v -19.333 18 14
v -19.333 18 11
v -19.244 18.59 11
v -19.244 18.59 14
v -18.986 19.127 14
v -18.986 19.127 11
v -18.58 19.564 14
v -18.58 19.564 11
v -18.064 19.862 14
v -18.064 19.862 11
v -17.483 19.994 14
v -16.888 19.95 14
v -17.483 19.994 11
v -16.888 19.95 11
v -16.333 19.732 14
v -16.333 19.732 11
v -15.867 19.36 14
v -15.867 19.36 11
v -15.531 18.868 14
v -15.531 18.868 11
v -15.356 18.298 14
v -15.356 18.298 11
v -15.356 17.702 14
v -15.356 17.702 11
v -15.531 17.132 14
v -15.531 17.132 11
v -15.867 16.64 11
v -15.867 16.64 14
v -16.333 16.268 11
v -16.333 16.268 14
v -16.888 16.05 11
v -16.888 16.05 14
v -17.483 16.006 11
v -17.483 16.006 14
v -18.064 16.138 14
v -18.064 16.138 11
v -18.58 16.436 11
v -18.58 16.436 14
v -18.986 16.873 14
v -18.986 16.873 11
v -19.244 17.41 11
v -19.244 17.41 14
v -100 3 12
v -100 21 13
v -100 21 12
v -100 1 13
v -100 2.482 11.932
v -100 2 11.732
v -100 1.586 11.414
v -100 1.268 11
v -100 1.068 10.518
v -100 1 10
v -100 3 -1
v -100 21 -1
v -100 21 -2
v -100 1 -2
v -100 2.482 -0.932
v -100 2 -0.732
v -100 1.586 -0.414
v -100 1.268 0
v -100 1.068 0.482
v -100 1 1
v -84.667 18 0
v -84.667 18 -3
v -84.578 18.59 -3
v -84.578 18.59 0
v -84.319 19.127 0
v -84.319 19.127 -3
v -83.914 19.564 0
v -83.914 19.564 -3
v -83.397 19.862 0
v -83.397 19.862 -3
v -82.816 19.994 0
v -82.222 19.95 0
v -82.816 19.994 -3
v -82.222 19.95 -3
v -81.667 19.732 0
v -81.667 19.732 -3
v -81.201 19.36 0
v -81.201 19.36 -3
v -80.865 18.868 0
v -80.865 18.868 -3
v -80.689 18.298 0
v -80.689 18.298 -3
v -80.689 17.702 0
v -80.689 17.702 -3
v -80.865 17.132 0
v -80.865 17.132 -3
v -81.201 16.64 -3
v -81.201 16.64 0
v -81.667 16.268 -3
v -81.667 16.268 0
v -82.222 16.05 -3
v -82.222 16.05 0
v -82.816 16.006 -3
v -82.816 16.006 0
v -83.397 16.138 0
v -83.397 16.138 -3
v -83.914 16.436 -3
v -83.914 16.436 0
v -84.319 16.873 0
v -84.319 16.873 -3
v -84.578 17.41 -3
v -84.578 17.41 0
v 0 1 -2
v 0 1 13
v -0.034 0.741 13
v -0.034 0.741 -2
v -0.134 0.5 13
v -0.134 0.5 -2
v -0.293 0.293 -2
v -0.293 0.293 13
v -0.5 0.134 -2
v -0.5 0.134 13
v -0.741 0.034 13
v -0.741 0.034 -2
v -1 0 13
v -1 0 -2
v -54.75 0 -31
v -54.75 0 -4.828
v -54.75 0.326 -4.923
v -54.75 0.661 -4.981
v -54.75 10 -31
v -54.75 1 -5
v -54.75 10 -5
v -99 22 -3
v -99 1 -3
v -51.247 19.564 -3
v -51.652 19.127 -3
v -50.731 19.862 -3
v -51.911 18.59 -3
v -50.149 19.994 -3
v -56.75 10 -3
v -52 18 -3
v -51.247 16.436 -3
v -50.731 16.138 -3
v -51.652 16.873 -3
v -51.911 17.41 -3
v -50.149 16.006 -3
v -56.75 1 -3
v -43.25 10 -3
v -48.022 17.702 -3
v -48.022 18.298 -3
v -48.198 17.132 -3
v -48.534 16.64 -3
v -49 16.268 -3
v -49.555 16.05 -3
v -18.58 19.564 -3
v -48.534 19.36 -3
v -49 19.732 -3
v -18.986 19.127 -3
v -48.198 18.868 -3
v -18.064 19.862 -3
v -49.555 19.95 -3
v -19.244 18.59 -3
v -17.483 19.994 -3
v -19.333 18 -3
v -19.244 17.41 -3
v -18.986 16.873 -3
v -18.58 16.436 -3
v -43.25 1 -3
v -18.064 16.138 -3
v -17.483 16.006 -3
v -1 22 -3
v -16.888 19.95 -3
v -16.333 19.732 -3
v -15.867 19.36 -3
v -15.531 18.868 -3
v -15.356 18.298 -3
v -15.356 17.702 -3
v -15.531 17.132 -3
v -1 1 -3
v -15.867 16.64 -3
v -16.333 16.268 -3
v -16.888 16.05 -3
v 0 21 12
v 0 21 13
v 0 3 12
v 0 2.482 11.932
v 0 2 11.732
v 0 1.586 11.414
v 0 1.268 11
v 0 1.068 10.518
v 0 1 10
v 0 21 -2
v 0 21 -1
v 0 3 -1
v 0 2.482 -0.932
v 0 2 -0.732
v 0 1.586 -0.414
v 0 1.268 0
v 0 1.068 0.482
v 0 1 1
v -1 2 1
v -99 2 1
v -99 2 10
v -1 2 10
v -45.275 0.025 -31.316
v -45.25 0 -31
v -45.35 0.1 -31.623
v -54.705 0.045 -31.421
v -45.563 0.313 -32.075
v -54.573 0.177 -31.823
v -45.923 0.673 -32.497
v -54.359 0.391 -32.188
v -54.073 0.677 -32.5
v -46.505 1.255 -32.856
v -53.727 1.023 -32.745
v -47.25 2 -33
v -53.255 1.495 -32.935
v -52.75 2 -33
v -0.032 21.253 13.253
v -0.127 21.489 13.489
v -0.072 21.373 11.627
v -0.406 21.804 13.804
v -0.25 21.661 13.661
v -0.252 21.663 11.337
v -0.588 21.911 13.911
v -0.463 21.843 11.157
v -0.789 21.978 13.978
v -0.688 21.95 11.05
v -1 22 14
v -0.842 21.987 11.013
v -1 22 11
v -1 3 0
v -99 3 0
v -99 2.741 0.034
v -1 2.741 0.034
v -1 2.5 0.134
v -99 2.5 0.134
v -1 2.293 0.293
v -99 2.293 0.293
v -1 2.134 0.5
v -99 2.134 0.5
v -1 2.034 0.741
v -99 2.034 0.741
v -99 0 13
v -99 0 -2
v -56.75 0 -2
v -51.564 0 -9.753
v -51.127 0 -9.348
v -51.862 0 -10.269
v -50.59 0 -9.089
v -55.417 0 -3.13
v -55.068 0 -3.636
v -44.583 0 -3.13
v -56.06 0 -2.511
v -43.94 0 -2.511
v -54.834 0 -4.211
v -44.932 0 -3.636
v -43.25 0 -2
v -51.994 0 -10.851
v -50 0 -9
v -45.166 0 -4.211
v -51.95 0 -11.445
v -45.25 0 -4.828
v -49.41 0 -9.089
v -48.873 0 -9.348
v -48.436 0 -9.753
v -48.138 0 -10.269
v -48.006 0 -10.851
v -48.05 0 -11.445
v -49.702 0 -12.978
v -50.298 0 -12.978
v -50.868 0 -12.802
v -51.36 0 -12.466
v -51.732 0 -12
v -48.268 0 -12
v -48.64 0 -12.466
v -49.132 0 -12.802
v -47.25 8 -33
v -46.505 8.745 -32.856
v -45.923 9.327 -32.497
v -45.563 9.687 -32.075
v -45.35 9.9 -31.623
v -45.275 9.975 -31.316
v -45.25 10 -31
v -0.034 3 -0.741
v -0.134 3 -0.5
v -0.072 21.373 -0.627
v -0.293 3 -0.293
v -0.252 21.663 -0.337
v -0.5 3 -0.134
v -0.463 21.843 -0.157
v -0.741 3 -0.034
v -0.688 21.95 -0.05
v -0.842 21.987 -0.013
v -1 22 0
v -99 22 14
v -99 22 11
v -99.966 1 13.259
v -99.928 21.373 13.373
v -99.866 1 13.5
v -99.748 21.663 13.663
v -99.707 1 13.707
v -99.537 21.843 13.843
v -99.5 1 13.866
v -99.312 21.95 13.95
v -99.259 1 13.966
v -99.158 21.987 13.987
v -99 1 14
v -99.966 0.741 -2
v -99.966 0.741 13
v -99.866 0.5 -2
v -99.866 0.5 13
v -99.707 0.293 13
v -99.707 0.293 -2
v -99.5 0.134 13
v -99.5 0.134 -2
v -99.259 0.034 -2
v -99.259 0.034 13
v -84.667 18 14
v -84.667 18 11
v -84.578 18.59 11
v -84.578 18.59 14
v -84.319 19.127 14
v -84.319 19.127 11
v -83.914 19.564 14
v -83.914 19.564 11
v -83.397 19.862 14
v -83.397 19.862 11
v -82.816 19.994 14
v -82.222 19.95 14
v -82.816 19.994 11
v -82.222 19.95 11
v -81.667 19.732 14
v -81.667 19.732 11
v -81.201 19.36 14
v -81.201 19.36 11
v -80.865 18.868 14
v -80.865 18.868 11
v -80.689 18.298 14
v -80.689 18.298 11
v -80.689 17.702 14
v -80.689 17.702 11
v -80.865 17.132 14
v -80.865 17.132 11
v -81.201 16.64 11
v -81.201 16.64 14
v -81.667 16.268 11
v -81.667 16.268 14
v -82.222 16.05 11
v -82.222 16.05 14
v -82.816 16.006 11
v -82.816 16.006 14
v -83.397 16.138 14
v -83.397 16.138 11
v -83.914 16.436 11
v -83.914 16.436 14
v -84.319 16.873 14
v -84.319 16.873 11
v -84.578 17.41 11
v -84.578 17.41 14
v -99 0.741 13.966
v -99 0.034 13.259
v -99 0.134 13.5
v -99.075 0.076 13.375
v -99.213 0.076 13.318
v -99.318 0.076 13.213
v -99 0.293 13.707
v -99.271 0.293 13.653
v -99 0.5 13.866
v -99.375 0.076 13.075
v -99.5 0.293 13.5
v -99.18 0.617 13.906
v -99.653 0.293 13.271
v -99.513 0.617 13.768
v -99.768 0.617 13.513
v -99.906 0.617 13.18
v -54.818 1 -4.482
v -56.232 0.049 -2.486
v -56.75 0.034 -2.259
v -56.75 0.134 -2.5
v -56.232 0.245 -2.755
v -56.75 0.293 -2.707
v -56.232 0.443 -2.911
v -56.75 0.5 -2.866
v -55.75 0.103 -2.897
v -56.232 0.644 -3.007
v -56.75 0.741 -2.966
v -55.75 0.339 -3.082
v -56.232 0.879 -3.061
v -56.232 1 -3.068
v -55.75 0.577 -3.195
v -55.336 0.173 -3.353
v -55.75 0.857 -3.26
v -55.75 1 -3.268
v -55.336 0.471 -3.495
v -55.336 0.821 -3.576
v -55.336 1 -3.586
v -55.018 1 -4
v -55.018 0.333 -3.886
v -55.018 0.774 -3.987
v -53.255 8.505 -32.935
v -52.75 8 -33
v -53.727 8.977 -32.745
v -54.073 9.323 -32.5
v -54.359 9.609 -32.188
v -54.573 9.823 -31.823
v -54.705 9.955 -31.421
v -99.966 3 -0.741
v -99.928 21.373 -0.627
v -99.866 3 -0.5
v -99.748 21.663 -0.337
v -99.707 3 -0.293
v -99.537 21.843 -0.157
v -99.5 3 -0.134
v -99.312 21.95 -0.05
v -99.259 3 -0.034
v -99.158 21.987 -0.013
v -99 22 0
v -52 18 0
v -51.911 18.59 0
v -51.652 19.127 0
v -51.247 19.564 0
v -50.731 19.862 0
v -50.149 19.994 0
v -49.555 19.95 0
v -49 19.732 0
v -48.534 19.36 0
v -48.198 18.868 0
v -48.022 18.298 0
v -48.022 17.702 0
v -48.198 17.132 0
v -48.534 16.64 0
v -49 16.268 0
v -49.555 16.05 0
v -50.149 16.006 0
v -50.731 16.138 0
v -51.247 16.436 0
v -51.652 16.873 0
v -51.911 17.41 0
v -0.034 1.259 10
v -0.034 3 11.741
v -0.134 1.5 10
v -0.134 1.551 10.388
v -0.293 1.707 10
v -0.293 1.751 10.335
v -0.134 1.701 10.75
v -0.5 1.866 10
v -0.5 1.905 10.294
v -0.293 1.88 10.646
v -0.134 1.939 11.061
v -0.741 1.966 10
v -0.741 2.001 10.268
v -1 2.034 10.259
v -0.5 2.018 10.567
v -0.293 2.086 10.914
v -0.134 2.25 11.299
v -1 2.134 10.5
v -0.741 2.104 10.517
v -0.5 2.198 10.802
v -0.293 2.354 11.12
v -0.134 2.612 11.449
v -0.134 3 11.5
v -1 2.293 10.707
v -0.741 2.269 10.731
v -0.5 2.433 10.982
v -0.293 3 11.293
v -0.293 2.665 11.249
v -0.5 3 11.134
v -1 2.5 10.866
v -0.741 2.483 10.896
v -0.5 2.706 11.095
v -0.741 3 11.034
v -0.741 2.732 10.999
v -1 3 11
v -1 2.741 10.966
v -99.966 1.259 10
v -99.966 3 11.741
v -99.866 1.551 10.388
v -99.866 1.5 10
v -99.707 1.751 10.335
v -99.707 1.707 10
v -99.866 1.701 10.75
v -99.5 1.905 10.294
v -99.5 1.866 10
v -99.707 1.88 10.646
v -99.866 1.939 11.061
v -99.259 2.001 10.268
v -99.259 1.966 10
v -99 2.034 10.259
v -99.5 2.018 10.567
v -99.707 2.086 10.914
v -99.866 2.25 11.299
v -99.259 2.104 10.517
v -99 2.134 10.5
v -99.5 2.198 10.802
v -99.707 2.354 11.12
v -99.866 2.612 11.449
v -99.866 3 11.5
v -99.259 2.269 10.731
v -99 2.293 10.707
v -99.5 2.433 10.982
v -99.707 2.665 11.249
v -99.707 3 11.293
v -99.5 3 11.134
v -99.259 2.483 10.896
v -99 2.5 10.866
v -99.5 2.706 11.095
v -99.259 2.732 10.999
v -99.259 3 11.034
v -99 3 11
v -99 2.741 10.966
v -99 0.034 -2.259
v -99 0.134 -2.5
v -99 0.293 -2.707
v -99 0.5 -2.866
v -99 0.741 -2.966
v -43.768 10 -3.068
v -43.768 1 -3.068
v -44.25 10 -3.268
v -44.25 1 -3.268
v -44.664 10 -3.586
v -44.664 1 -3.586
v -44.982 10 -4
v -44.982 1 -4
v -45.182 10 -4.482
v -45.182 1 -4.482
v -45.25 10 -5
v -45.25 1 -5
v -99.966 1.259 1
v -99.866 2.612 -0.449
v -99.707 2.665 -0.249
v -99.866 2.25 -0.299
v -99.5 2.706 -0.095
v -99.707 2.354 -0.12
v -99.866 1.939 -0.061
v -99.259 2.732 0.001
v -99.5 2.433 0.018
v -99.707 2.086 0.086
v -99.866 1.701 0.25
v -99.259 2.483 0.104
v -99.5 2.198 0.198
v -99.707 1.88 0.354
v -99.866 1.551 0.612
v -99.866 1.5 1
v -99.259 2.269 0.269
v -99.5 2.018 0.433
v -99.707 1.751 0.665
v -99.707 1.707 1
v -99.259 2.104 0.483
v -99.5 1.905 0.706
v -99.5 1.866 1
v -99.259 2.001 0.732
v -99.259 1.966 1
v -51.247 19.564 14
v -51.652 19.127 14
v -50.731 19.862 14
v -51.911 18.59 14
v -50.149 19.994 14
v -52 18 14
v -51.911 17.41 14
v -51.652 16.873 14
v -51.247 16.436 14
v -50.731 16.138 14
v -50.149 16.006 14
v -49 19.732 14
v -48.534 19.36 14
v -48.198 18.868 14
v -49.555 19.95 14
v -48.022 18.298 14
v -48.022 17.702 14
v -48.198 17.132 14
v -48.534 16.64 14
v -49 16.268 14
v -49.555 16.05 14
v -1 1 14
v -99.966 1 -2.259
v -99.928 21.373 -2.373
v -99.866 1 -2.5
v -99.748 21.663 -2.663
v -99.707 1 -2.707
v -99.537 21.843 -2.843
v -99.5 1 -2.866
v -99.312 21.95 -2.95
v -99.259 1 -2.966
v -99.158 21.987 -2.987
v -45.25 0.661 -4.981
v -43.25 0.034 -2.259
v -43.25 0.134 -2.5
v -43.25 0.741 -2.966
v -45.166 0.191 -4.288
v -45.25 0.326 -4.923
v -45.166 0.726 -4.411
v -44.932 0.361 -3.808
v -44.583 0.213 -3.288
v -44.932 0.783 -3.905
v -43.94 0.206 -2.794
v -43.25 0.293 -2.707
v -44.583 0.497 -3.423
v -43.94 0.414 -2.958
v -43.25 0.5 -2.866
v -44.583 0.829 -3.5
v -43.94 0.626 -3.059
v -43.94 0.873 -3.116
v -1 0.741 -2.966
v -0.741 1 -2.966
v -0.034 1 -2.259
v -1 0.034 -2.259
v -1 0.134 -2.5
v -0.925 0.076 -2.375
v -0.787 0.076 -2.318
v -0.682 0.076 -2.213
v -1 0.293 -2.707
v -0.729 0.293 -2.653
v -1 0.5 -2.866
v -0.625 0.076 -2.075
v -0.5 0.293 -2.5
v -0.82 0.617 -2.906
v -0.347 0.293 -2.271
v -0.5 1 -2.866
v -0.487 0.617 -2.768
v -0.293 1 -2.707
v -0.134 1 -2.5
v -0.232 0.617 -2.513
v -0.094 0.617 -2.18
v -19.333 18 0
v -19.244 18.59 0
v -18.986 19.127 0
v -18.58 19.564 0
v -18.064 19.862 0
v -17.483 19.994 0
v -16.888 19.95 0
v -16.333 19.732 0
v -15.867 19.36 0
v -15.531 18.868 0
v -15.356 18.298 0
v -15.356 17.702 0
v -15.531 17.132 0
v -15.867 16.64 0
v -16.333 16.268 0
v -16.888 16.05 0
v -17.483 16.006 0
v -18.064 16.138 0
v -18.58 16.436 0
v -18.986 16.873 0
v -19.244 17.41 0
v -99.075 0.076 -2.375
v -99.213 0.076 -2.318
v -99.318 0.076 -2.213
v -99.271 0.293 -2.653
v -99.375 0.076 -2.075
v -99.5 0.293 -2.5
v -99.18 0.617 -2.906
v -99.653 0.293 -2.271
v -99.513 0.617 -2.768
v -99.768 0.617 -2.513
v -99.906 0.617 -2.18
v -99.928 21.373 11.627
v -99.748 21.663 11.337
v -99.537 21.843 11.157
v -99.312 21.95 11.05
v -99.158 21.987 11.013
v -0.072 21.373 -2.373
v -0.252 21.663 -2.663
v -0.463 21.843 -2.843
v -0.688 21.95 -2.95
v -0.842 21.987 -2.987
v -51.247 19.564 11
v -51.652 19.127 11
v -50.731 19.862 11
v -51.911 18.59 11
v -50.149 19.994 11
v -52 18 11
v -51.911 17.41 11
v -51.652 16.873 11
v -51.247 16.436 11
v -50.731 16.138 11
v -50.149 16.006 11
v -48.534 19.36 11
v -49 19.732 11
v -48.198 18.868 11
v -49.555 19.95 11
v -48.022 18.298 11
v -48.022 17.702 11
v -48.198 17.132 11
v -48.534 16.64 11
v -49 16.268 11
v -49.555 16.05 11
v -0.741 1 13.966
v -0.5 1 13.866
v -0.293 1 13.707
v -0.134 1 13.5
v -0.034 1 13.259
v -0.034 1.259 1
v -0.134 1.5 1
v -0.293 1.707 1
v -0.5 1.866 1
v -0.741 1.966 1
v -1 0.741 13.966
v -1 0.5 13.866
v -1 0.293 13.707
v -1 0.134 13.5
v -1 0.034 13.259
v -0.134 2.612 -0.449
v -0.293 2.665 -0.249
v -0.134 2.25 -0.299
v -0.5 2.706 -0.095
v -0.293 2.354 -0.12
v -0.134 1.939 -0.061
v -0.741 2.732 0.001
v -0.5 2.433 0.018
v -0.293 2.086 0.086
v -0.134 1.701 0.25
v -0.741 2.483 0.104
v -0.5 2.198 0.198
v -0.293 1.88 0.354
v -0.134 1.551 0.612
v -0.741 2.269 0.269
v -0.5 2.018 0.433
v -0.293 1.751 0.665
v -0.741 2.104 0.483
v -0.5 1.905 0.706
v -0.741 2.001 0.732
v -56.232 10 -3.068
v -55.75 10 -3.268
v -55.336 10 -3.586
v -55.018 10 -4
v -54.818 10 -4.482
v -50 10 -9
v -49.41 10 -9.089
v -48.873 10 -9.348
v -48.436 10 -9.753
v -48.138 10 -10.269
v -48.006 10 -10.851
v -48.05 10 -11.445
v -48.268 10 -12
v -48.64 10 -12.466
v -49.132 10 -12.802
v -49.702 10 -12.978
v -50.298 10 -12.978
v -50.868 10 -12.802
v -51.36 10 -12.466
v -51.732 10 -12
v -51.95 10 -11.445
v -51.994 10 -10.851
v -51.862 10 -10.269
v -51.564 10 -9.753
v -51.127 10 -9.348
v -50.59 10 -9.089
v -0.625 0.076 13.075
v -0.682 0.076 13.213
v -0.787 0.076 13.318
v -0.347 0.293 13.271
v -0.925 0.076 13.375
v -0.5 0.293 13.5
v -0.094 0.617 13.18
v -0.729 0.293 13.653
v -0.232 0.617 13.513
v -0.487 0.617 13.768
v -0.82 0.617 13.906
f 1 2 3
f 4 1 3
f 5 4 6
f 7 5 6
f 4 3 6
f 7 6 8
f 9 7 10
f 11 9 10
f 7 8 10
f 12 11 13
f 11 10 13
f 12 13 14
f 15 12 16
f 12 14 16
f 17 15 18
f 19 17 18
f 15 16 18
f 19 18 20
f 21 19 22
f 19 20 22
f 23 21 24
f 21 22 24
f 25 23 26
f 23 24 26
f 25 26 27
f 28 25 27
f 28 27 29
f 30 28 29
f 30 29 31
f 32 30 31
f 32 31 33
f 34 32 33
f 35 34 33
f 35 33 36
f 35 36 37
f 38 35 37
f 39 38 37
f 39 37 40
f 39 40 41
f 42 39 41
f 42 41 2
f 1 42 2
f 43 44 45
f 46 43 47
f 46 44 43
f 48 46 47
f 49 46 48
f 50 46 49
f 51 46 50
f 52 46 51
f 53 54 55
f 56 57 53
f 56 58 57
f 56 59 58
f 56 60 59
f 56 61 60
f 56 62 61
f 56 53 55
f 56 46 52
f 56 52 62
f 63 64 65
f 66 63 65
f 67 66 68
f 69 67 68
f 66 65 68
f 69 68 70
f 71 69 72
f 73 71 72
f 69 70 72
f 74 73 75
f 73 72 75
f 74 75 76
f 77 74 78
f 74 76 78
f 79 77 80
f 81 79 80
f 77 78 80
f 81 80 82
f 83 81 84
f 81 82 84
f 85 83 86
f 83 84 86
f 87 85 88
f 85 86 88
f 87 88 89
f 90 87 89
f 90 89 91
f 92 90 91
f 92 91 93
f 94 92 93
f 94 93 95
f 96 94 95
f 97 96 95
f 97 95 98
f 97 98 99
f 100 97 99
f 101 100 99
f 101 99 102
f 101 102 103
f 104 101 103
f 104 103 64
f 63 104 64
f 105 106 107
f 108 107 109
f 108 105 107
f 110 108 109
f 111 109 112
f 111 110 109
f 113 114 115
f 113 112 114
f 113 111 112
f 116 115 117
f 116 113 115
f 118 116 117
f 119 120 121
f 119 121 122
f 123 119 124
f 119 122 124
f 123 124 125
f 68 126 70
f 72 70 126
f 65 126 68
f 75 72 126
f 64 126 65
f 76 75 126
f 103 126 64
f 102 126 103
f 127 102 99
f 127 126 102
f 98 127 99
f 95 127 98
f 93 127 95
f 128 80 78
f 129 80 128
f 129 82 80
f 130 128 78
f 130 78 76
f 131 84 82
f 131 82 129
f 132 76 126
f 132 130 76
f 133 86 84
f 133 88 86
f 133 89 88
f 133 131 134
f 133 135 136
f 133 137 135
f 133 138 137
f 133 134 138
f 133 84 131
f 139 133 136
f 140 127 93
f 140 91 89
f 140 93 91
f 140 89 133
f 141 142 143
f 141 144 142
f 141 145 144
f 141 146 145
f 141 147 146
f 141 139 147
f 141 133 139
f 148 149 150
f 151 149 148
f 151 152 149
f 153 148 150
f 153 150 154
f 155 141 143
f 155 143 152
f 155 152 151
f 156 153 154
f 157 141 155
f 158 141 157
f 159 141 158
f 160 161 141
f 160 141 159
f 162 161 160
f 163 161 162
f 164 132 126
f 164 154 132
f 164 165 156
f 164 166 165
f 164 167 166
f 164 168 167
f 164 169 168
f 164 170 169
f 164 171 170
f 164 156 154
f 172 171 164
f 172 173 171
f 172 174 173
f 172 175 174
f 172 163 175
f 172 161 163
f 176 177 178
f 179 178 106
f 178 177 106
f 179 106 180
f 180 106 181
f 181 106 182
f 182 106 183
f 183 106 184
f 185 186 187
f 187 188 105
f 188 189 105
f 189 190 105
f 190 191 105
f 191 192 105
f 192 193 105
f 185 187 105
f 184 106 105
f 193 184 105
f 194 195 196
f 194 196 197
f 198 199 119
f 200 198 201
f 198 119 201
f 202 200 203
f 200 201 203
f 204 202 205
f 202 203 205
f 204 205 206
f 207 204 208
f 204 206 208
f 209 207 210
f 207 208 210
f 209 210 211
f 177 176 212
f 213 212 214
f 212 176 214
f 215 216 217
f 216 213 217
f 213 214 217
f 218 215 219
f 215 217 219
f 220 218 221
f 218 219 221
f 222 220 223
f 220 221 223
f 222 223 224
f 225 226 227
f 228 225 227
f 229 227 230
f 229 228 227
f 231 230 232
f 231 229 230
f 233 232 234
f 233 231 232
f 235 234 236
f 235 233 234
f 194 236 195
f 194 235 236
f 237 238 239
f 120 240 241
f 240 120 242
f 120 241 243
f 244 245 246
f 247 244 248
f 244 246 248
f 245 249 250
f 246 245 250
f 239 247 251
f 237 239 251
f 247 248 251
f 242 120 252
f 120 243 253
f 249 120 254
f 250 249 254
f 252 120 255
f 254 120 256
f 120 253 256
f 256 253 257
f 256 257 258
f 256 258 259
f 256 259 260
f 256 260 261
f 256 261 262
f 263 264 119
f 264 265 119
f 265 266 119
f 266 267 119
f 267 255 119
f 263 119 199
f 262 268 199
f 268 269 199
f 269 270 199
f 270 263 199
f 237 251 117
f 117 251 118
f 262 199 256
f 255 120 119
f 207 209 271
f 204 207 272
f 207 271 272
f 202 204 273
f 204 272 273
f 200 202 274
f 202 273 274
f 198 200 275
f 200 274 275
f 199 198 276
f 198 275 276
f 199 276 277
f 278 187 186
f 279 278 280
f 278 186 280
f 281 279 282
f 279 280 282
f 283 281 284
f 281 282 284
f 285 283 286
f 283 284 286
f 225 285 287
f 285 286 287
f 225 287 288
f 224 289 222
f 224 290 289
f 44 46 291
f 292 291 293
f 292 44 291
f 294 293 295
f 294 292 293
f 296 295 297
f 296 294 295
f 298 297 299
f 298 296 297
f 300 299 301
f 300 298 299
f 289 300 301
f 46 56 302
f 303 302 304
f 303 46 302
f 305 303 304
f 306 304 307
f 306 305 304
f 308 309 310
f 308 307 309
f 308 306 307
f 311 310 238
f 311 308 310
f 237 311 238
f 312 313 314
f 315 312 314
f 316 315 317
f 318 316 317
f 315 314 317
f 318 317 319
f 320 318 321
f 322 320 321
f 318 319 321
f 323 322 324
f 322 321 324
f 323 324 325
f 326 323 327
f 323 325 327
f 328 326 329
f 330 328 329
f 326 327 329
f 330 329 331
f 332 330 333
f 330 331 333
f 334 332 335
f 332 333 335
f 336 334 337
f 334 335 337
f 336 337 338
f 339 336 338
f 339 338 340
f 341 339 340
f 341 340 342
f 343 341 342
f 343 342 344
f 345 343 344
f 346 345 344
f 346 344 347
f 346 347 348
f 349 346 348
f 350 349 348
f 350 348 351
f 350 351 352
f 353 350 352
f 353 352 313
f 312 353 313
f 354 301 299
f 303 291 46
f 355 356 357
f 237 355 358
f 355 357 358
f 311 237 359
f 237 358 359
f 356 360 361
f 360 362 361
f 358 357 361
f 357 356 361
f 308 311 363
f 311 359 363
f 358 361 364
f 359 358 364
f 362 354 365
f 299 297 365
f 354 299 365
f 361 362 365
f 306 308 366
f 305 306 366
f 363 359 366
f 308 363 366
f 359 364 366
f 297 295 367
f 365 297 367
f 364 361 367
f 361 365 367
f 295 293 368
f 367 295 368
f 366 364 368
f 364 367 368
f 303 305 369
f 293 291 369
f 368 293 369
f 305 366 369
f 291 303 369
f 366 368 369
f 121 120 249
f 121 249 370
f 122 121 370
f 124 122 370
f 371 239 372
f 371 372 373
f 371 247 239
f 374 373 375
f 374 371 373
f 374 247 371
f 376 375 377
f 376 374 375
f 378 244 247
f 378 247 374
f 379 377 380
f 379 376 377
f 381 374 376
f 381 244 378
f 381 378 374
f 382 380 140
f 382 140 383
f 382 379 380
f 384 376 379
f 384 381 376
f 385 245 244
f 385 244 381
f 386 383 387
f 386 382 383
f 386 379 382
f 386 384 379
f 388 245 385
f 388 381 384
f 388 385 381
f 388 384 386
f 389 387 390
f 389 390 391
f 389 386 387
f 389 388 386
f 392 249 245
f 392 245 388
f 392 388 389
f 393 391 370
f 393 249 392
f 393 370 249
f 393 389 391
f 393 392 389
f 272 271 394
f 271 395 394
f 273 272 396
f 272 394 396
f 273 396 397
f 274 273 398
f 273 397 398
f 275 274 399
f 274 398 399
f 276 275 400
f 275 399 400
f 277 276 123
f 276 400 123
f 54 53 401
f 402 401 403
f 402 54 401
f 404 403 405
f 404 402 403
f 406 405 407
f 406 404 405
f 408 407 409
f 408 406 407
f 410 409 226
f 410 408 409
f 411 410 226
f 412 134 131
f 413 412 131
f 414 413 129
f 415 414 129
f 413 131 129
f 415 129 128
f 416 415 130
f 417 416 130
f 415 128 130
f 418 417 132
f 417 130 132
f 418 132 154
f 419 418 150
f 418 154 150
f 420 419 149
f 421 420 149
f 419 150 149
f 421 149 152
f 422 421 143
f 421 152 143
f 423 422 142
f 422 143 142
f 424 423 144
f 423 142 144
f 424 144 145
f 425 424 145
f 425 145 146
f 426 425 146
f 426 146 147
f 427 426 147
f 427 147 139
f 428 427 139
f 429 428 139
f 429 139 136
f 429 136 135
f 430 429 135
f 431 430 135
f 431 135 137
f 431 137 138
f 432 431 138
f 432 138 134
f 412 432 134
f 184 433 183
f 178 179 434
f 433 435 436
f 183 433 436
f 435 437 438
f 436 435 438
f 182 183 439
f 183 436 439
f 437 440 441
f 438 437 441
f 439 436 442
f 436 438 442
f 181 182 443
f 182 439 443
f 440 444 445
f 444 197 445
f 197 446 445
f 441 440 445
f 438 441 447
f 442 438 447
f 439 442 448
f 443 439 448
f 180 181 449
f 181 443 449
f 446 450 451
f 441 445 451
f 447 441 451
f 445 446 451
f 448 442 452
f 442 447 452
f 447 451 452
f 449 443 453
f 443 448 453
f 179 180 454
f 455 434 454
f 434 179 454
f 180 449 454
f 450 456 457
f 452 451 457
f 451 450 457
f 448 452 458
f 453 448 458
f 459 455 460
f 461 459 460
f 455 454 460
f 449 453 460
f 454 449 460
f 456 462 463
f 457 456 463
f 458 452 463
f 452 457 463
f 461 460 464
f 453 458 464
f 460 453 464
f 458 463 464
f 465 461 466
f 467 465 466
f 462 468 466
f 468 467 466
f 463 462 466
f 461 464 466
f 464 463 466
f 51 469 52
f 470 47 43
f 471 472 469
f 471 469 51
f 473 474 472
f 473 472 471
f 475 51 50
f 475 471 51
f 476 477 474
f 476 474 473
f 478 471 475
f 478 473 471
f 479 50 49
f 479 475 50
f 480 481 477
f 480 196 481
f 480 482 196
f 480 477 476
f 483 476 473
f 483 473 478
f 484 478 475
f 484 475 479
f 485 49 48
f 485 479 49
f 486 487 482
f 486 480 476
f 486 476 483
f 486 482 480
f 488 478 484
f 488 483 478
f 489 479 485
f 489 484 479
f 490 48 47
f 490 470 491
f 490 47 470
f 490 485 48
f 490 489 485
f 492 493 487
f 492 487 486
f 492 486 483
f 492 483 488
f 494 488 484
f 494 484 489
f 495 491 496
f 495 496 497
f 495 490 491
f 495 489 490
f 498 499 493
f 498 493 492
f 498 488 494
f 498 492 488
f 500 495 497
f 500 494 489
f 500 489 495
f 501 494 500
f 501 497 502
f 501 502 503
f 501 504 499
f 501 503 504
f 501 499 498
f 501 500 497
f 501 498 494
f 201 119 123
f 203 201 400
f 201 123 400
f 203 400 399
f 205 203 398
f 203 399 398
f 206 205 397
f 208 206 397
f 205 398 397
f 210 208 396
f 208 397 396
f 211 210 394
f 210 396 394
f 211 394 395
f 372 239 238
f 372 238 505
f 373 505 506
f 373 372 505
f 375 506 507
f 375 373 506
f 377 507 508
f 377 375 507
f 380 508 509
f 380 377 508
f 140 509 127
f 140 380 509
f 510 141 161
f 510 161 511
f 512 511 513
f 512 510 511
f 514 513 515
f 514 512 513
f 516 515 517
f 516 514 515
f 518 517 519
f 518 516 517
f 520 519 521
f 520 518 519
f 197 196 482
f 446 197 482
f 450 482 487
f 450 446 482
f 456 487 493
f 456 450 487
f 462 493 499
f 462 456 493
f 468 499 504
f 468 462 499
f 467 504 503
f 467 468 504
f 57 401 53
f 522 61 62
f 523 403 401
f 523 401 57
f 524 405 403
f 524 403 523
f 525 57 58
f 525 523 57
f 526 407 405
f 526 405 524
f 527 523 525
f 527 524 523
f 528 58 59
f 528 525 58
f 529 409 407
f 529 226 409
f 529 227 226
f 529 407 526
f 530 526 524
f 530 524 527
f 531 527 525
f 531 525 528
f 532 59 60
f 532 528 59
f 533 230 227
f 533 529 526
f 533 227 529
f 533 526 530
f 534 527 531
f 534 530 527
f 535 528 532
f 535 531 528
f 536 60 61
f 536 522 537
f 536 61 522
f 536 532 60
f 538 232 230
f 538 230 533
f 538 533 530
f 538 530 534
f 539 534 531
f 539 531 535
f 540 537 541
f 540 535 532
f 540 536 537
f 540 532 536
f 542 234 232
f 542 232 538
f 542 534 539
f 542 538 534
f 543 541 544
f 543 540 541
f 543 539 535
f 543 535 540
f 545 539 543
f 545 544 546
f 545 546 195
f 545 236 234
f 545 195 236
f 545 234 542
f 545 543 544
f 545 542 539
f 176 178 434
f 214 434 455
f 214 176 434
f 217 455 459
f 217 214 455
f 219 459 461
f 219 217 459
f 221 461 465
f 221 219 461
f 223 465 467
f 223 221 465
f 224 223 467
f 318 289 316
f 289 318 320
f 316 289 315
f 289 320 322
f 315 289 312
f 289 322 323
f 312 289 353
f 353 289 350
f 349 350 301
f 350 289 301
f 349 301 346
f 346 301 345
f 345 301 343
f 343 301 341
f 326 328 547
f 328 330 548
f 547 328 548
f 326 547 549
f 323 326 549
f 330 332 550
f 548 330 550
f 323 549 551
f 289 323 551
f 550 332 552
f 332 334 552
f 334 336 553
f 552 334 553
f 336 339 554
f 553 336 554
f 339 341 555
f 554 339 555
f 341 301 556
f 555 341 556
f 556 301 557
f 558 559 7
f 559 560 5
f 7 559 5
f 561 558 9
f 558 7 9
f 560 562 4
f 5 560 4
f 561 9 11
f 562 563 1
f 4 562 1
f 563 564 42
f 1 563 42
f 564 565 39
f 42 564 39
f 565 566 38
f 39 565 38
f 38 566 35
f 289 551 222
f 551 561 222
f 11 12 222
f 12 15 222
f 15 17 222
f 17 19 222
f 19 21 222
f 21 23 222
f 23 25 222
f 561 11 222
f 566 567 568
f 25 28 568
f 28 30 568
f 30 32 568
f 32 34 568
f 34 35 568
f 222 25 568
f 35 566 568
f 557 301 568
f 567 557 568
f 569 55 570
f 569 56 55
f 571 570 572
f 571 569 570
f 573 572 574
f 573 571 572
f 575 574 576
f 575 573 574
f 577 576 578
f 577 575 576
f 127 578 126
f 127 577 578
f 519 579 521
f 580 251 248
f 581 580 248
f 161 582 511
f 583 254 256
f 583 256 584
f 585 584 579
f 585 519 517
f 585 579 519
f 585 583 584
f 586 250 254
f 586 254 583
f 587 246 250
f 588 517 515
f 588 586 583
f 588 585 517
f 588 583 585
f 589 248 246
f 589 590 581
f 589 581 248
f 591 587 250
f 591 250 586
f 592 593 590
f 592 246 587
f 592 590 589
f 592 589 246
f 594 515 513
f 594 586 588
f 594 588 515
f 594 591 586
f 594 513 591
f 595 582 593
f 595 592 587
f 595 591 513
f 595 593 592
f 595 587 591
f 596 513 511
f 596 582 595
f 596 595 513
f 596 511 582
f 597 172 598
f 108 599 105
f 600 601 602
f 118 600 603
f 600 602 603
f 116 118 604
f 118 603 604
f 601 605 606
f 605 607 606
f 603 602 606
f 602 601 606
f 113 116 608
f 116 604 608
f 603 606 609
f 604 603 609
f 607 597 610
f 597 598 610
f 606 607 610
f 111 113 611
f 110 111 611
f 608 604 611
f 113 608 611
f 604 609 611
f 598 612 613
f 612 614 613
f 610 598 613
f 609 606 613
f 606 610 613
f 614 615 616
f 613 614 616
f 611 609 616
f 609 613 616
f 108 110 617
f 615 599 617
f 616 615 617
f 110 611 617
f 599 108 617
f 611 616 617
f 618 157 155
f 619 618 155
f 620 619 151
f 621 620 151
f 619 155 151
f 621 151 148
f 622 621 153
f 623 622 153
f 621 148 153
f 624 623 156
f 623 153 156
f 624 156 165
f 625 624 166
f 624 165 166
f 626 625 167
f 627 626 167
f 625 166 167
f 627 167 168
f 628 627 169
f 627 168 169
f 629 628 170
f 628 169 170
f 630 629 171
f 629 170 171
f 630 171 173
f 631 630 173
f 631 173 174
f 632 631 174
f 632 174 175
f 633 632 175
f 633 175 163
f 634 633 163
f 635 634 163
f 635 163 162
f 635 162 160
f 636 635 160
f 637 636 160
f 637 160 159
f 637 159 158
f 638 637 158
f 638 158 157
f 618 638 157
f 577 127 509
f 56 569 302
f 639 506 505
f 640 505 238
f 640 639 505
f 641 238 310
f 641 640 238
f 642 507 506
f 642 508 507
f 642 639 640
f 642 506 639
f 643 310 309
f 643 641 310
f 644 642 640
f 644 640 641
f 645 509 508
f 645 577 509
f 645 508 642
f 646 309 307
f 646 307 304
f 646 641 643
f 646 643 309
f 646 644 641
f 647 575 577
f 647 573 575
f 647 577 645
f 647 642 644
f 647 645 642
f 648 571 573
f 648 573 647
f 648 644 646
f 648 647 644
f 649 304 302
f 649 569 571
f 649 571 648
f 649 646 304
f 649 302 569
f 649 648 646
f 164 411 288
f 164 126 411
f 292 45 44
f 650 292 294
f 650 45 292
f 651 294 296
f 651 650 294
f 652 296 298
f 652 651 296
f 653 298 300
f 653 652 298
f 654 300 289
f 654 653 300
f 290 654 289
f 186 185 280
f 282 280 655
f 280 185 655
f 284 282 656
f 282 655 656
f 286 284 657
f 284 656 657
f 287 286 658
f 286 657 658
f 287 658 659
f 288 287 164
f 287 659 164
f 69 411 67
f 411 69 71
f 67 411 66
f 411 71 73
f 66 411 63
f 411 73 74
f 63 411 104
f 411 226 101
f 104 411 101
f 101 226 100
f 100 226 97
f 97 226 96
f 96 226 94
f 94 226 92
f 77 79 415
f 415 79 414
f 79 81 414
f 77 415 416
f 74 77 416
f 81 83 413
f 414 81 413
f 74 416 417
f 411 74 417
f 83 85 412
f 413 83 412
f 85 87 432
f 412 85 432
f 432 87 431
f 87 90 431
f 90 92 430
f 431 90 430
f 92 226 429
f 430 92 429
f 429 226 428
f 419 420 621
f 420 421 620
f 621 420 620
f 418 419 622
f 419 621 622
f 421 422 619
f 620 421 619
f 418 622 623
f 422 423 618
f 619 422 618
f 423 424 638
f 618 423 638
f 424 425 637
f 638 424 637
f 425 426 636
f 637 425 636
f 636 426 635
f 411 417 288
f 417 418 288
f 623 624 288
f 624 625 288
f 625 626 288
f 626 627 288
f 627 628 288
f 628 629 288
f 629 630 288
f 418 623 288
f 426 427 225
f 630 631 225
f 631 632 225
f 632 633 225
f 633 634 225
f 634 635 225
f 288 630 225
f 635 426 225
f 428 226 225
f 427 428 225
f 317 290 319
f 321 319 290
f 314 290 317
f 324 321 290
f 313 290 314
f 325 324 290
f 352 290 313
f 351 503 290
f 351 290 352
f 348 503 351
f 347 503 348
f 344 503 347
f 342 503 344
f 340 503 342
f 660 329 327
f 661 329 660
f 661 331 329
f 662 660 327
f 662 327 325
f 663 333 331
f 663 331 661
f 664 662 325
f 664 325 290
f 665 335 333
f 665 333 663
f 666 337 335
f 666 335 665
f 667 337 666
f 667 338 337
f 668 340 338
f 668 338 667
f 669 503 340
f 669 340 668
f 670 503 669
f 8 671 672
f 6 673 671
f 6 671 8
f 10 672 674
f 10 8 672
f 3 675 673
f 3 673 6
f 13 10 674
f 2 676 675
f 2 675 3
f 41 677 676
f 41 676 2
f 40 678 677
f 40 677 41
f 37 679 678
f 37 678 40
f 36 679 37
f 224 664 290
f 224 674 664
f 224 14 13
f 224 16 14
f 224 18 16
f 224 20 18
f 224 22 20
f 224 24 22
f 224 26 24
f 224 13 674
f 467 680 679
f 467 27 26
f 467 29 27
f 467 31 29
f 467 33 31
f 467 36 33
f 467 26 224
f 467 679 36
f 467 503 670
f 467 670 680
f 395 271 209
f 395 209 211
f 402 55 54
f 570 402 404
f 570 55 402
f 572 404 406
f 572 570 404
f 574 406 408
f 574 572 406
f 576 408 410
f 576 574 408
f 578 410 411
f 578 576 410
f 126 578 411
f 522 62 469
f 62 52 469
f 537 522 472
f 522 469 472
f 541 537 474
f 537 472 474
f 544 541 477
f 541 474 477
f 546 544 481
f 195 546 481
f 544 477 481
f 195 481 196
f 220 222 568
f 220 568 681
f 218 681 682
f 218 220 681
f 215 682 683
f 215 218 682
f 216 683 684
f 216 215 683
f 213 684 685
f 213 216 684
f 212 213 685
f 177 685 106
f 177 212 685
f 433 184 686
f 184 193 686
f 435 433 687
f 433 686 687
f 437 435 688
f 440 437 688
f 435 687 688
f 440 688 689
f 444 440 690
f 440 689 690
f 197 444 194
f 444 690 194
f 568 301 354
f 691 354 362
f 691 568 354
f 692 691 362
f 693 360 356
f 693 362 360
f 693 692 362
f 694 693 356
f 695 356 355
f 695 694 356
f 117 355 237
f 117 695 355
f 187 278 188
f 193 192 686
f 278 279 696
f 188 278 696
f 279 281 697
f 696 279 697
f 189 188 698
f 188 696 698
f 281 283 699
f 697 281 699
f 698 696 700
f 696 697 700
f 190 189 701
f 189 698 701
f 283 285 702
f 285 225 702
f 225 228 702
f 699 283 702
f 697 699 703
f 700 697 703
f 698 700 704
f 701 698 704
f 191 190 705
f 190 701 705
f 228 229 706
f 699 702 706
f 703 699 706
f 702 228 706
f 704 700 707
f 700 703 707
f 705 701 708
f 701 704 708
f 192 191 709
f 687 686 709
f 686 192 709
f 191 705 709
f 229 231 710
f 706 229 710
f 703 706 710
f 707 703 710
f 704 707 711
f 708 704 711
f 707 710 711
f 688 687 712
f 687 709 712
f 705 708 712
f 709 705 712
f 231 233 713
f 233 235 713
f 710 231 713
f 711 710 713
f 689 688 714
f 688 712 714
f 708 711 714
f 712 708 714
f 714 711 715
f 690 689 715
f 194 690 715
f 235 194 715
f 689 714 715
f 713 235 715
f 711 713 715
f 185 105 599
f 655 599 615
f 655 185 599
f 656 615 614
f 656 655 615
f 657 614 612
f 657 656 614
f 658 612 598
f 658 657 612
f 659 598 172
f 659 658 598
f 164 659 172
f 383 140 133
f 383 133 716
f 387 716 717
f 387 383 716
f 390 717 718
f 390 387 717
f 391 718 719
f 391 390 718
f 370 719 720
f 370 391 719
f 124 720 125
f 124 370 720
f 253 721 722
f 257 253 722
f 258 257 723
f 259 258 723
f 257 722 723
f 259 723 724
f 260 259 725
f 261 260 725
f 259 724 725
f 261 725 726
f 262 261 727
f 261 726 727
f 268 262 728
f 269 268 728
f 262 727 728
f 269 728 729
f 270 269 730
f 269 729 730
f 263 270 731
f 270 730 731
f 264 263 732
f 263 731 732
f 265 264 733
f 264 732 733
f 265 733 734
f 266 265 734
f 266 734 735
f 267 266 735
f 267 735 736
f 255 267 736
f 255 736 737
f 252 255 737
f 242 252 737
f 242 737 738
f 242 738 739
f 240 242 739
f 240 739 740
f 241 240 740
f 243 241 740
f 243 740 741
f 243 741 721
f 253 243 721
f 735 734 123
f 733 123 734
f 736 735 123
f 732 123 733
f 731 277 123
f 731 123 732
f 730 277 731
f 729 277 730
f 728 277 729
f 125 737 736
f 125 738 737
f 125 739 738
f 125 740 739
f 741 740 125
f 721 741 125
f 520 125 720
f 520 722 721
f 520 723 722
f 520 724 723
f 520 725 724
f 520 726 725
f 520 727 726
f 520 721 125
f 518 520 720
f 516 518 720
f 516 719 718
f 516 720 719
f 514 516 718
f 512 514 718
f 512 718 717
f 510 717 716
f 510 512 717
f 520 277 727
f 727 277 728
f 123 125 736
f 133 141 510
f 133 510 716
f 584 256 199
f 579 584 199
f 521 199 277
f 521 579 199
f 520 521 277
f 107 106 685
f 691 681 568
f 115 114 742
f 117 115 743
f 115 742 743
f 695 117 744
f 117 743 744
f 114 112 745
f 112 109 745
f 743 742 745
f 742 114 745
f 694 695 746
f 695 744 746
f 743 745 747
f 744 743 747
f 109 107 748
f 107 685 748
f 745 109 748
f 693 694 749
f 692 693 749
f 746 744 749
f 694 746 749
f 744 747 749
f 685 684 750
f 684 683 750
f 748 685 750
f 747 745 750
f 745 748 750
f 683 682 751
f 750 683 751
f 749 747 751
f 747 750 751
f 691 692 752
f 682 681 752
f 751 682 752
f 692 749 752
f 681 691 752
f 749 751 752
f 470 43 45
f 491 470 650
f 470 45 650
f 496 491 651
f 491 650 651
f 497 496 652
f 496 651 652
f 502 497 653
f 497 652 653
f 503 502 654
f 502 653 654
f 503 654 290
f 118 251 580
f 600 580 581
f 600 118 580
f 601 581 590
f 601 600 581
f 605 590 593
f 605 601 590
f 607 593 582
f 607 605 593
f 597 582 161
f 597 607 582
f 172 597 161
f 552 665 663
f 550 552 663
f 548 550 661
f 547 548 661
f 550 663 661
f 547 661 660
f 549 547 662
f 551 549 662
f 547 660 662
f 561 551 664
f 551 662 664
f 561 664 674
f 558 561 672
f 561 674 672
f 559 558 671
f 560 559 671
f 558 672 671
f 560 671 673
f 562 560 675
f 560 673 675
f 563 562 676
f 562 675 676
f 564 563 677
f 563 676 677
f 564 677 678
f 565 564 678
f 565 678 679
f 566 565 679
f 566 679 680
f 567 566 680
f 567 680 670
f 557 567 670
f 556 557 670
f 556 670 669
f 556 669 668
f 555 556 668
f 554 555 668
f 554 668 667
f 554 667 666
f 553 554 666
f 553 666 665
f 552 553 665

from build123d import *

# Parameters (mm, degrees)
SKETCH2_W                = 100
SKETCH2_H                = 3
SKETCH2_H_2              = 11
BOSS_EXTRUDE2_DEPTH      = 2
SKETCH3_W                = 100
SKETCH3_H                = 3
BOSS_EXTRUDE3_DEPTH      = 20
FILLET2_R                = 1
BOSS_EXTRUDE5_DEPTH      = 30
BOSS_EXTRUDE5_DEPTH_BACK = 1
SKETCH5_W                = 9.5
SKETCH5_H                = 10
FILLET3_R                = 2
FILLET4_R                = 2
SKETCH6_R                = 2
CUT_EXTRUDE1_DEPTH       = 39
SKETCH7_R                = 2
CUT_EXTRUDE2_DEPTH       = 39


# Some blends are built 0.0001 mm under size
with BuildPart() as part:
    # Sketch2 → Boss-Extrude2 (new body)
    with BuildSketch(Plane(origin=(0, 0, 0), x_dir=(1, 0, 0), z_dir=(0, 1, 0))):
        with Locations((-50, 1.5)):
            Rectangle(SKETCH2_W, SKETCH2_H)
        with Locations((-50, -5.5)):
            Rectangle(SKETCH2_W, SKETCH2_H_2)
        with Locations((-50, -12.5)):
            Rectangle(SKETCH2_W, SKETCH2_H)
    extrude(amount=BOSS_EXTRUDE2_DEPTH)

    # Sketch3 → Boss-Extrude3 (add)
    with BuildSketch(Plane(origin=(0, 2, 0), x_dir=(1, 0, 0), z_dir=(0, 1, 0))):
        with Locations((-50, -12.5)):
            Rectangle(SKETCH3_W, SKETCH3_H)
        with Locations((-50, 1.5)):
            Rectangle(SKETCH3_W, SKETCH3_H)
    extrude(amount=BOSS_EXTRUDE3_DEPTH)

    # Fillet2
    fillet2_edges = [part.edges().sort_by_distance(p)[0] for p in [
        (-100, 11, -3),
        (0, 11, -3),
        (0, 11, 14),
        (-100, 11, 14),
        (-100, 2, 5.5),
        (0, 2, 5.5),
        (0, 12, 11),
        (-100, 12, 11),
        (-100, 22, 12.5),
        (0, 22, 12.5),
        (-50, 2, 11),
        (-50, 2, 0),
        (-100, 12, 0),
        (0, 12, 0),
        (-100, 22, -1.5),
        (0, 22, -1.5),
        (-50, 0, -3),
        (0, 0, 5.5),
        (-50, 0, 14),
        (-100, 0, 5.5),
    ]]
    fillet(fillet2_edges, radius=FILLET2_R - 0.0001)  # a hair under: the kernel refuses the full size

    # Sketch5 → Boss-Extrude5 (add, two sides: drawn at the far end of the back side and taken through both)
    with BuildSketch(Plane(origin=(0, 0, -3), x_dir=(-1, 0, 0), z_dir=(0, 0, -1)).offset(-BOSS_EXTRUDE5_DEPTH_BACK)):
        with Locations((50, 5)):
            Rectangle(SKETCH5_W, SKETCH5_H)
    extrude(amount=BOSS_EXTRUDE5_DEPTH + BOSS_EXTRUDE5_DEPTH_BACK)

    # Fillet3
    fillet3_edges = [part.edges().sort_by_distance(p)[0] for p in [
        (-45.25, 5, -33),
        (-50, 0, -33),
        (-54.75, 5, -33),
        (-50, 10, -33),
    ]]
    fillet(fillet3_edges, radius=FILLET3_R)

    # Fillet4
    # the kernel refuses this fillet: 2 mm, written as the material it adds along each edge
    with BuildSketch(Plane(origin=(-54.75, 0.9999, -2.0001), x_dir=(0, 0.0062831439655585564, -0.9999802608561371), z_dir=(0, -0.9999802608561371, -0.0062831439655585564))) as fillet4_piece_1_section:
        with BuildLine():
            CenterArc((-0.9999 - FILLET4_R, -FILLET4_R), FILLET4_R, 0, 90)
            Line((-0.9999, -FILLET4_R), (-0.9999, 0))
            Line((-0.9999, 0), (-0.9999 - FILLET4_R, 0))
        make_face()
    fillet4_piece_1 = revolve(axis=Axis((-54.75, 0.9999, -2.0001), (1, 0, 0)), revolution_arc=359.64, mode=Mode.PRIVATE)
    fillet4_piece_1 = split(fillet4_piece_1, bisect_by=Plane(origin=(-55.461006322, 0, -2.760267515), z_dir=(0, 1, 0)), keep=Keep.TOP, mode=Mode.PRIVATE)
    fillet4_piece_1 = split(fillet4_piece_1, bisect_by=Plane(origin=(-55.461006322, 0.239732481, 0), z_dir=(0, 0, -1)), keep=Keep.TOP, mode=Mode.PRIVATE)
    add(fillet4_piece_1)
    with BuildSketch(Plane(origin=(-45.25, 0.9999, -2.0001), x_dir=(0, 0.0062831439655585564, -0.9999802608561371), z_dir=(0, -0.9999802608561371, -0.0062831439655585564))) as fillet4_piece_2_section:
        with BuildLine():
            CenterArc((-0.9999 - FILLET4_R, FILLET4_R), FILLET4_R, 270, 90)
            Line((-0.9999, FILLET4_R), (-0.9999, 0))
            Line((-0.9999, 0), (-0.9999 - FILLET4_R, 0))
        make_face()
    fillet4_piece_2 = revolve(axis=Axis((-45.25, 0.9999, -2.0001), (1, 0, 0)), revolution_arc=359.64, mode=Mode.PRIVATE)
    fillet4_piece_2 = split(fillet4_piece_2, bisect_by=Plane(origin=(-44.538993678, 0, -2.760267519), z_dir=(0, 1, 0)), keep=Keep.TOP, mode=Mode.PRIVATE)
    fillet4_piece_2 = split(fillet4_piece_2, bisect_by=Plane(origin=(-44.538993678, 0.239732485, 0), z_dir=(0, 0, -1)), keep=Keep.TOP, mode=Mode.PRIVATE)
    add(fillet4_piece_2)
    with BuildSketch(Plane(origin=(-45.25, 10, -3), x_dir=(0, 0, -1), z_dir=(0, -1, 0)), Plane(origin=(-54.75, 0.9999, -3), x_dir=(0, 0, -1), z_dir=(0, 1, 0))) as fillet4_piece_3:
        with BuildLine():
            CenterArc((FILLET4_R, FILLET4_R), FILLET4_R, 180, 90)
            Line((0, FILLET4_R), (0, 0))
            Line((0, 0), (FILLET4_R, 0))
        make_face()
    extrude(amount=9.0001)

    # Sketch6 → Cut-Extrude1 (cut)
    with BuildSketch(Plane(origin=(0, 0, -3), x_dir=(-1, 0, 0), z_dir=(0, 0, -1))):
        with Locations((17.333333335, 18)):
            Circle(SKETCH6_R)
        with Locations((50.000000335, 18)):
            Circle(SKETCH6_R)
        with Locations((82.666667335, 18)):
            Circle(SKETCH6_R)
    extrude(amount=-CUT_EXTRUDE1_DEPTH, mode=Mode.SUBTRACT)

    # Sketch7 → Cut-Extrude2 (cut)
    with BuildSketch(Plane(origin=(0, 10, 0), x_dir=(1, 0, 0), z_dir=(0, 1, 0))):
        with Locations(Location((-50, 11, 0), (0, 0, 270))):
            Circle(SKETCH7_R)
    extrude(amount=-CUT_EXTRUDE2_DEPTH, mode=Mode.SUBTRACT)


solid = part.part
